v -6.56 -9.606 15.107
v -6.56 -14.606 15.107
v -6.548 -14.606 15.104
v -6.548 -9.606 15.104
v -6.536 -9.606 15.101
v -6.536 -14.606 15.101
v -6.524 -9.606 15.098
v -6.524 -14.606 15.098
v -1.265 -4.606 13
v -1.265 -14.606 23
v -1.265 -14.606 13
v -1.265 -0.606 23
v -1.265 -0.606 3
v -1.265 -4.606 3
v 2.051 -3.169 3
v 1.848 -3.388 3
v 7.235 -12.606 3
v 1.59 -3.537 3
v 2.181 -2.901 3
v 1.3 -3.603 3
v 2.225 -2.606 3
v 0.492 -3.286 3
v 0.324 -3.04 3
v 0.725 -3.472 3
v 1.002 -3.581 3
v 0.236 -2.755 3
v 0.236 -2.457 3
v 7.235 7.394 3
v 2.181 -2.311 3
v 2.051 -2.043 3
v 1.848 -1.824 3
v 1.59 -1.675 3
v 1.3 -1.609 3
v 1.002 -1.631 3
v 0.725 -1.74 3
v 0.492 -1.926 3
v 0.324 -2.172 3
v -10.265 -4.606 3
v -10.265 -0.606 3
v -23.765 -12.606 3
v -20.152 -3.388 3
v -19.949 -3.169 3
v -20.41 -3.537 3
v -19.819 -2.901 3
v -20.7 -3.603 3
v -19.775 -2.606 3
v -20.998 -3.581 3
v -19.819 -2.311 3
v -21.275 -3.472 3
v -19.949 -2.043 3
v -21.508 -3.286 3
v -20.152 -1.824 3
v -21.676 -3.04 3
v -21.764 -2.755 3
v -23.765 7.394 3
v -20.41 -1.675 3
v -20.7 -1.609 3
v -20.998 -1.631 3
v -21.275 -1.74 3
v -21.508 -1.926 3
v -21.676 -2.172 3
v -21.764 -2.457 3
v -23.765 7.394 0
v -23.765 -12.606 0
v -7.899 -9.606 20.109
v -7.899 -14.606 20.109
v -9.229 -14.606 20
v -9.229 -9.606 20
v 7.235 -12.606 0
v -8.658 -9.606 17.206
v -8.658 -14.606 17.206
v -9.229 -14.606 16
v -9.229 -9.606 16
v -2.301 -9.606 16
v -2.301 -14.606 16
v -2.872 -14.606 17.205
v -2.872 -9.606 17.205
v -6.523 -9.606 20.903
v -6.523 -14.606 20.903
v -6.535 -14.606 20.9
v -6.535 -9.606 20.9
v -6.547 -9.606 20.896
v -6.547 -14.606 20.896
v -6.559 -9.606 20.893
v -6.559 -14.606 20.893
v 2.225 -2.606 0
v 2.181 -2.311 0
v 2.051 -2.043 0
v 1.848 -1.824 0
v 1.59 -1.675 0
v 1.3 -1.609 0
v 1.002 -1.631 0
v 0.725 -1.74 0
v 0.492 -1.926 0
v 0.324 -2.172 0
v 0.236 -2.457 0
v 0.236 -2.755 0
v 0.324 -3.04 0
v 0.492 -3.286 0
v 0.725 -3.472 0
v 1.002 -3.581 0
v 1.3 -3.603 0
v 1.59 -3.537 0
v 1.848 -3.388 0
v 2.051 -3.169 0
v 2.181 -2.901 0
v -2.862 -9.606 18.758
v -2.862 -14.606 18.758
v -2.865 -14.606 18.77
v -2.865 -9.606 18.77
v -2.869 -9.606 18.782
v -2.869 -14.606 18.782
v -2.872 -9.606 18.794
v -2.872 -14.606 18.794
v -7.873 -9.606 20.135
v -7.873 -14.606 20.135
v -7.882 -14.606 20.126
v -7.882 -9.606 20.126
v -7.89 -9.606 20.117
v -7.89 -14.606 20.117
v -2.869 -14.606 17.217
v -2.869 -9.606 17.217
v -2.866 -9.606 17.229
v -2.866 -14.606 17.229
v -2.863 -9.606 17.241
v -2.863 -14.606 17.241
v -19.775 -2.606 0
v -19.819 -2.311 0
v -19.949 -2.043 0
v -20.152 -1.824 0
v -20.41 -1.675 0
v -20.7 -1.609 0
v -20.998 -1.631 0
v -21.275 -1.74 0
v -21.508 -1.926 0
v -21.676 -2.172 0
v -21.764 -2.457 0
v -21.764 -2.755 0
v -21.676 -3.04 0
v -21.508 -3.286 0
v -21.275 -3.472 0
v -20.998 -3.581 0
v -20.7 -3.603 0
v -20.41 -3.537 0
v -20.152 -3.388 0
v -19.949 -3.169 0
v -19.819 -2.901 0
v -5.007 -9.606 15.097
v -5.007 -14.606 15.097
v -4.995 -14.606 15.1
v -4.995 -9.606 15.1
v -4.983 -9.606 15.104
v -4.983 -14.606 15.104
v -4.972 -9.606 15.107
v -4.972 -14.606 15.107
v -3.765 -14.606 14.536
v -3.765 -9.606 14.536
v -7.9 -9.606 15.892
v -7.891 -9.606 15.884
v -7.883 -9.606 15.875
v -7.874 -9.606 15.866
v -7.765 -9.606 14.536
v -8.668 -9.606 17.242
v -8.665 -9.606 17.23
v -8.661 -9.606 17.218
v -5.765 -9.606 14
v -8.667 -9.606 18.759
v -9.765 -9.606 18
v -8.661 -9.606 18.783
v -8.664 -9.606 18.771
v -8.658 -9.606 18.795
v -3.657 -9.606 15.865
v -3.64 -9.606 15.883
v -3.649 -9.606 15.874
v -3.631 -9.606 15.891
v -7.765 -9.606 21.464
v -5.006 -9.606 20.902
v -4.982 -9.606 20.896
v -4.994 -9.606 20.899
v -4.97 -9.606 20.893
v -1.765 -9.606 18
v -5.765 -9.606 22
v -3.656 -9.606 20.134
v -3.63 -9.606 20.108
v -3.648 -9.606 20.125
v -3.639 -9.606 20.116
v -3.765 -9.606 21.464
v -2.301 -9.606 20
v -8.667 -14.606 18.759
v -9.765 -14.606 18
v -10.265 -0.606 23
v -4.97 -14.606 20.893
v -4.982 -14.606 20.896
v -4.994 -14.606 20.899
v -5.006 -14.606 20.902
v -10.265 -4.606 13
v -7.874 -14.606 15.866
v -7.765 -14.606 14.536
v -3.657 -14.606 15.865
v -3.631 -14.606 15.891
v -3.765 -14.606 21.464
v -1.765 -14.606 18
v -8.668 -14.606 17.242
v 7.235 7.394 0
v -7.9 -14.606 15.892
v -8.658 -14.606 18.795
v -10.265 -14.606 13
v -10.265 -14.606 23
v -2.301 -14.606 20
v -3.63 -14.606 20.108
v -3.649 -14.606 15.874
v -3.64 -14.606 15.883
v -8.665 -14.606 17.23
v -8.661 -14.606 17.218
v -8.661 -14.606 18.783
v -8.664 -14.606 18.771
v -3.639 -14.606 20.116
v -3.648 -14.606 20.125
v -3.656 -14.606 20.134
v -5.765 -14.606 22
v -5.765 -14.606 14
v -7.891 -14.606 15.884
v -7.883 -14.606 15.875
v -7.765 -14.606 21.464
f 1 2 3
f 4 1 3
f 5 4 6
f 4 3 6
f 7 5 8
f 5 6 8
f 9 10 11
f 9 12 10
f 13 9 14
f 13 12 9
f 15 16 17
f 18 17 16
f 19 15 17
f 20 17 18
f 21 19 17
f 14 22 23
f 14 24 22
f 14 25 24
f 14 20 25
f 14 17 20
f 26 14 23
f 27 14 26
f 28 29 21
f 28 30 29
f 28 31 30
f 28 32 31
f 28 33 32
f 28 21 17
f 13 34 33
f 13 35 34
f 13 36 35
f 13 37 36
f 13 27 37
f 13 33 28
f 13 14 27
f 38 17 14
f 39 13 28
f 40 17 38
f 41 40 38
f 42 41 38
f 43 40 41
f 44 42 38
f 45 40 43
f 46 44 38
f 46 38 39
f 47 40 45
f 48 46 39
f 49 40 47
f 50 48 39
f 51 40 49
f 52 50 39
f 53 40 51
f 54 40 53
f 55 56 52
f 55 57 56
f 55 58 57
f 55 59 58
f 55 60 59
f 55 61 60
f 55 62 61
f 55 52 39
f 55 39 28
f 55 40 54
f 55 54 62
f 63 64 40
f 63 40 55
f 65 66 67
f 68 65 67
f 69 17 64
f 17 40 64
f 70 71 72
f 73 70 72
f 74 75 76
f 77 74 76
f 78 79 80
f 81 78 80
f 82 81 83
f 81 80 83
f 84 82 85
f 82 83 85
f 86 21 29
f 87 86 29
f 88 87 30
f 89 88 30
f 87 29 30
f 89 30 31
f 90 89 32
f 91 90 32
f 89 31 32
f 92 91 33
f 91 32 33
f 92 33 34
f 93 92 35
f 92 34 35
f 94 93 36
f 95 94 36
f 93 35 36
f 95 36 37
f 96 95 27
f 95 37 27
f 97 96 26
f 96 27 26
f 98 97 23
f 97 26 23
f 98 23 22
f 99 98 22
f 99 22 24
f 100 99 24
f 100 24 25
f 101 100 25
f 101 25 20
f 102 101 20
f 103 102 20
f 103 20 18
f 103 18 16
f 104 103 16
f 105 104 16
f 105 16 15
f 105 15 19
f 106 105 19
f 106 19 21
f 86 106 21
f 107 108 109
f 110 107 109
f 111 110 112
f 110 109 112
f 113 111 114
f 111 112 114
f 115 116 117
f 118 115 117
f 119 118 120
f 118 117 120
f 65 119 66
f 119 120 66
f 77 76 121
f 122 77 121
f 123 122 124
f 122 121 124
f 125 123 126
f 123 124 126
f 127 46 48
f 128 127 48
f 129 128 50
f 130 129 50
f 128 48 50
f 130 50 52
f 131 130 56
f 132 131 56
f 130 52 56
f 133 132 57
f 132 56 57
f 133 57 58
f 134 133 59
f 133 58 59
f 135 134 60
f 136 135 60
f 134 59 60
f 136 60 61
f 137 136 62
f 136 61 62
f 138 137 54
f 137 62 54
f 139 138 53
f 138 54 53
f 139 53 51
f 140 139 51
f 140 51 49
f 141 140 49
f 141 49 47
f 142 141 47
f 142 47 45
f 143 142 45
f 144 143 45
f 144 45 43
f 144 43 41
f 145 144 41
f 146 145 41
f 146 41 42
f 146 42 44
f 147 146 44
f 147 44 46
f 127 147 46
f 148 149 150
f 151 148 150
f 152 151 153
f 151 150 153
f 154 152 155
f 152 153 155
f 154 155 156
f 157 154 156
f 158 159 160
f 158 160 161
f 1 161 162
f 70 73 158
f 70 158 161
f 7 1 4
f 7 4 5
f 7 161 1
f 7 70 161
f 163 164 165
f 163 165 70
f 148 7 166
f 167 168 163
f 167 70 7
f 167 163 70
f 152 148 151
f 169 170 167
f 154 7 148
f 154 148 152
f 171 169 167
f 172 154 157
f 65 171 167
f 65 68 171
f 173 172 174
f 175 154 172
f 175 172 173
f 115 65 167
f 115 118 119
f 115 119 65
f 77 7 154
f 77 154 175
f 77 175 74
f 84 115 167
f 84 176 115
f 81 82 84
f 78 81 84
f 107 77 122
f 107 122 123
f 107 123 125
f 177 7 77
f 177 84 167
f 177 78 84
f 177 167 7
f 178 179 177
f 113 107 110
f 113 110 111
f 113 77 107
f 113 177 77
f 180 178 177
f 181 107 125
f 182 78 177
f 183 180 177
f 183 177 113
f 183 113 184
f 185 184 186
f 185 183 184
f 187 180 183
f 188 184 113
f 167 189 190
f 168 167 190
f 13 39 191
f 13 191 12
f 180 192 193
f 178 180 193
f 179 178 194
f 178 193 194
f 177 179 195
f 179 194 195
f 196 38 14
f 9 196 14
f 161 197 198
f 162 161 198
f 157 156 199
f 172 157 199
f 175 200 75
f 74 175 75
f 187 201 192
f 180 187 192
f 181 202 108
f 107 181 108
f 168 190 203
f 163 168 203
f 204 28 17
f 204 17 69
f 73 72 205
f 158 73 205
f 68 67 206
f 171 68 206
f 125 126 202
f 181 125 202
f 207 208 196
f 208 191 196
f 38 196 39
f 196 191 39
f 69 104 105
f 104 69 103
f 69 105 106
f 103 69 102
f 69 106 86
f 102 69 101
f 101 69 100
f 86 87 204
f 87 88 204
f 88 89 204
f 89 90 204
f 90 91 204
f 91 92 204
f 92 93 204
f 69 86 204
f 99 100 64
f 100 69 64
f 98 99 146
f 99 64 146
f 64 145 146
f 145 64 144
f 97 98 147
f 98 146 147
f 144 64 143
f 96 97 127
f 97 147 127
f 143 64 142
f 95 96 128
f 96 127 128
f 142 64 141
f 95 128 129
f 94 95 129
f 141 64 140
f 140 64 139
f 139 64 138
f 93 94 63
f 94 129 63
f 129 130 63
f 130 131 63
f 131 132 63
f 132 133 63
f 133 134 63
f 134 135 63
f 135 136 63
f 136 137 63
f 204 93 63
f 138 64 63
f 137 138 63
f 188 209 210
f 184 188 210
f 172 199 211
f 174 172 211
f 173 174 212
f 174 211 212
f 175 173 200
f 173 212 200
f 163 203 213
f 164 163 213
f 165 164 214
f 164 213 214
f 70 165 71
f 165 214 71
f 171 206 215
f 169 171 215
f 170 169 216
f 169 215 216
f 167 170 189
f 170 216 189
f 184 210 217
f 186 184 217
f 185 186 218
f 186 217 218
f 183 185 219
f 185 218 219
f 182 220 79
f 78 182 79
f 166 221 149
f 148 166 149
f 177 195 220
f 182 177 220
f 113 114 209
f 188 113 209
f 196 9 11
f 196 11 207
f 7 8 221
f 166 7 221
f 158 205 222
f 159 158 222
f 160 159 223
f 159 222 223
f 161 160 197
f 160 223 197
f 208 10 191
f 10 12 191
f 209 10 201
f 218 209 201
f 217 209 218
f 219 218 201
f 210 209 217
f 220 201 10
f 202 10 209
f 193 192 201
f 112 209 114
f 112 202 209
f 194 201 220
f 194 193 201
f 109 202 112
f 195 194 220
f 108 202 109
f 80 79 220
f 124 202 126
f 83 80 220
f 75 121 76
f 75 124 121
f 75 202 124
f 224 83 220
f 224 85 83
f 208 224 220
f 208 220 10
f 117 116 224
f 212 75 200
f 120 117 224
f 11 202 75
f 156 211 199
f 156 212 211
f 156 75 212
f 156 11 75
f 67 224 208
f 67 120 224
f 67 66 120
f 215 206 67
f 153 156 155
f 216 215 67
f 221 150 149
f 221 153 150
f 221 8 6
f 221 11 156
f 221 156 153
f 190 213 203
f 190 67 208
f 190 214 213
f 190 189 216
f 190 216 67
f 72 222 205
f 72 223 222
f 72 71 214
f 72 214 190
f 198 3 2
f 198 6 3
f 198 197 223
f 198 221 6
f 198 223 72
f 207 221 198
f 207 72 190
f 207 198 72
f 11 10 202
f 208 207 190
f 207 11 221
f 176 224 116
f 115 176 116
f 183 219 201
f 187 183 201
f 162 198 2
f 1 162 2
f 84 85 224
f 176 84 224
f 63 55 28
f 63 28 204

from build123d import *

# Parameters (mm, degrees)
ESQUISSE1_W             = 26
ESQUISSE1_H             = 20
BOSS_EXTRU_1_DEPTH      = 3
ESQUISSE2_R             = 1
ENL_V_MAT_EXTRU_1_DEPTH = 10
ESQUISSE3_W             = 9
ESQUISSE3_H             = 4
BOSS_EXTRU_2_DEPTH      = 20
ESQUISSE10_W            = 9
ESQUISSE10_H            = 10
BOSS_EXTRU_3_DEPTH      = 10
ENL_V_MAT_EXTRU_9_DEPTH = 5
ESQUISSE13_W            = 3
ESQUISSE13_H            = 20
BOSS_EXTRU_4_DEPTH      = 5


with BuildPart() as part:
    # Esquisse1 → Boss.-Extru.1 (new body)
    with BuildSketch(Plane.XY):
        with Locations((-10.76504298, -2.606017192)):
            Rectangle(ESQUISSE1_W, ESQUISSE1_H)
    extrude(amount=BOSS_EXTRU_1_DEPTH)

    # Esquisse2 → Enlèv. mat.-Extru.1 (cut)
    with BuildSketch(Plane.XY.offset(3)):
        with Locations((-20.77504298, -2.606017192)):
            Circle(ESQUISSE2_R)
        with Locations((1.22495702, -2.606017192)):
            Circle(ESQUISSE2_R)
    extrude(amount=-ENL_V_MAT_EXTRU_1_DEPTH, mode=Mode.SUBTRACT)

    # Esquisse3 → Boss.-Extru.2 (add)
    with BuildSketch(Plane.XY.offset(3)):
        with Locations((-5.76504298, -2.606017192)):
            Rectangle(ESQUISSE3_W, ESQUISSE3_H)
    extrude(amount=BOSS_EXTRU_2_DEPTH)

    # Esquisse10 → Boss.-Extru.3 (add)
    with BuildSketch(Plane(origin=(0, -4.606017192, 0), x_dir=(-1, 0, 0), z_dir=(0, -1, 0))):
        with Locations((5.76504298, -18)):
            Rectangle(ESQUISSE10_W, ESQUISSE10_H)
    extrude(amount=BOSS_EXTRU_3_DEPTH)

    # Esquisse12 → Enlèv. mat.-Extru.9 (cut)
    with BuildSketch(Plane.XZ.offset(14.606017192)):
        with BuildLine():
            Line((-1.76504298, 18), (-2.862370428, 18.757952542))
            ThreePointArc((-2.862370428, 18.757952542), (-2.867078041, 18.775757187), (-2.871894865, 18.793532598))
            Line((-2.871894865, 18.793532598), (-2.300941365, 20))
            Line((-2.300941365, 20), (-3.630231082, 20.107742433))
            ThreePointArc((-3.630231082, 20.107742433), (-3.643210317, 20.120807901), (-3.656269514, 20.133793446))
            Line((-3.656269514, 20.133793446), (-3.76504298, 21.464101615))
            Line((-3.76504298, 21.464101615), (-4.970112861, 20.89276444))
            ThreePointArc((-4.970112861, 20.89276444), (-4.987885942, 20.89758985), (-5.005688311, 20.902306063))
            Line((-5.005688311, 20.902306063), (-5.76504298, 22))
            Line((-5.76504298, 22), (-6.522995522, 20.902672552))
            ThreePointArc((-6.522995522, 20.902672552), (-6.540800167, 20.897964939), (-6.558575577, 20.893148115))
            Line((-6.558575577, 20.893148115), (-7.76504298, 21.464101615))
            Line((-7.76504298, 21.464101615), (-7.872785412, 20.134811898))
            ThreePointArc((-7.872785412, 20.134811898), (-7.885850881, 20.121832663), (-7.898836426, 20.108773466))
            Line((-7.898836426, 20.108773466), (-9.229144595, 20))
            Line((-9.229144595, 20), (-8.65780742, 18.794930119))
            ThreePointArc((-8.65780742, 18.794930119), (-8.66263283, 18.777157038), (-8.667349043, 18.759354669))
            Line((-8.667349043, 18.759354669), (-9.76504298, 18))
            Line((-9.76504298, 18), (-8.667715532, 17.242047458))
            ThreePointArc((-8.667715532, 17.242047458), (-8.663007919, 17.224242813), (-8.658191095, 17.206467402))
            Line((-8.658191095, 17.206467402), (-9.229144595, 16))
            Line((-9.229144595, 16), (-7.899854878, 15.892257567))
            ThreePointArc((-7.899854878, 15.892257567), (-7.886875643, 15.879192099), (-7.873816446, 15.866206554))
            Line((-7.873816446, 15.866206554), (-7.76504298, 14.535898385))
            Line((-7.76504298, 14.535898385), (-6.559973099, 15.10723556))
            ThreePointArc((-6.559973099, 15.10723556), (-6.542200018, 15.10241015), (-6.524397649, 15.097693937))
            Line((-6.524397649, 15.097693937), (-5.76504298, 14))
            Line((-5.76504298, 14), (-5.007090438, 15.097327448))
            ThreePointArc((-5.007090438, 15.097327448), (-4.989285793, 15.102035061), (-4.971510382, 15.106851885))
            Line((-4.971510382, 15.106851885), (-3.76504298, 14.535898385))
            Line((-3.76504298, 14.535898385), (-3.657300547, 15.865188102))
            ThreePointArc((-3.657300547, 15.865188102), (-3.644235079, 15.878167337), (-3.631249534, 15.891226534))
            Line((-3.631249534, 15.891226534), (-2.300941365, 16))
            Line((-2.300941365, 16), (-2.87227854, 17.205069881))
            ThreePointArc((-2.87227854, 17.205069881), (-2.86745313, 17.222842962), (-2.862736916, 17.240645331))
            Line((-2.862736916, 17.240645331), (-1.76504298, 18))
        make_face()
    extrude(amount=-ENL_V_MAT_EXTRU_9_DEPTH, mode=Mode.SUBTRACT)

    # Esquisse13 → Boss.-Extru.4 (add)
    with BuildSketch(Plane(origin=(2.23495702, 0, 0), x_dir=(0, 0, -1), z_dir=(1, 0, 0))):
        with Locations((-1.5, -2.606017192)):
            Rectangle(ESQUISSE13_W, ESQUISSE13_H)
    extrude(amount=BOSS_EXTRU_4_DEPTH)


solid = part.part
